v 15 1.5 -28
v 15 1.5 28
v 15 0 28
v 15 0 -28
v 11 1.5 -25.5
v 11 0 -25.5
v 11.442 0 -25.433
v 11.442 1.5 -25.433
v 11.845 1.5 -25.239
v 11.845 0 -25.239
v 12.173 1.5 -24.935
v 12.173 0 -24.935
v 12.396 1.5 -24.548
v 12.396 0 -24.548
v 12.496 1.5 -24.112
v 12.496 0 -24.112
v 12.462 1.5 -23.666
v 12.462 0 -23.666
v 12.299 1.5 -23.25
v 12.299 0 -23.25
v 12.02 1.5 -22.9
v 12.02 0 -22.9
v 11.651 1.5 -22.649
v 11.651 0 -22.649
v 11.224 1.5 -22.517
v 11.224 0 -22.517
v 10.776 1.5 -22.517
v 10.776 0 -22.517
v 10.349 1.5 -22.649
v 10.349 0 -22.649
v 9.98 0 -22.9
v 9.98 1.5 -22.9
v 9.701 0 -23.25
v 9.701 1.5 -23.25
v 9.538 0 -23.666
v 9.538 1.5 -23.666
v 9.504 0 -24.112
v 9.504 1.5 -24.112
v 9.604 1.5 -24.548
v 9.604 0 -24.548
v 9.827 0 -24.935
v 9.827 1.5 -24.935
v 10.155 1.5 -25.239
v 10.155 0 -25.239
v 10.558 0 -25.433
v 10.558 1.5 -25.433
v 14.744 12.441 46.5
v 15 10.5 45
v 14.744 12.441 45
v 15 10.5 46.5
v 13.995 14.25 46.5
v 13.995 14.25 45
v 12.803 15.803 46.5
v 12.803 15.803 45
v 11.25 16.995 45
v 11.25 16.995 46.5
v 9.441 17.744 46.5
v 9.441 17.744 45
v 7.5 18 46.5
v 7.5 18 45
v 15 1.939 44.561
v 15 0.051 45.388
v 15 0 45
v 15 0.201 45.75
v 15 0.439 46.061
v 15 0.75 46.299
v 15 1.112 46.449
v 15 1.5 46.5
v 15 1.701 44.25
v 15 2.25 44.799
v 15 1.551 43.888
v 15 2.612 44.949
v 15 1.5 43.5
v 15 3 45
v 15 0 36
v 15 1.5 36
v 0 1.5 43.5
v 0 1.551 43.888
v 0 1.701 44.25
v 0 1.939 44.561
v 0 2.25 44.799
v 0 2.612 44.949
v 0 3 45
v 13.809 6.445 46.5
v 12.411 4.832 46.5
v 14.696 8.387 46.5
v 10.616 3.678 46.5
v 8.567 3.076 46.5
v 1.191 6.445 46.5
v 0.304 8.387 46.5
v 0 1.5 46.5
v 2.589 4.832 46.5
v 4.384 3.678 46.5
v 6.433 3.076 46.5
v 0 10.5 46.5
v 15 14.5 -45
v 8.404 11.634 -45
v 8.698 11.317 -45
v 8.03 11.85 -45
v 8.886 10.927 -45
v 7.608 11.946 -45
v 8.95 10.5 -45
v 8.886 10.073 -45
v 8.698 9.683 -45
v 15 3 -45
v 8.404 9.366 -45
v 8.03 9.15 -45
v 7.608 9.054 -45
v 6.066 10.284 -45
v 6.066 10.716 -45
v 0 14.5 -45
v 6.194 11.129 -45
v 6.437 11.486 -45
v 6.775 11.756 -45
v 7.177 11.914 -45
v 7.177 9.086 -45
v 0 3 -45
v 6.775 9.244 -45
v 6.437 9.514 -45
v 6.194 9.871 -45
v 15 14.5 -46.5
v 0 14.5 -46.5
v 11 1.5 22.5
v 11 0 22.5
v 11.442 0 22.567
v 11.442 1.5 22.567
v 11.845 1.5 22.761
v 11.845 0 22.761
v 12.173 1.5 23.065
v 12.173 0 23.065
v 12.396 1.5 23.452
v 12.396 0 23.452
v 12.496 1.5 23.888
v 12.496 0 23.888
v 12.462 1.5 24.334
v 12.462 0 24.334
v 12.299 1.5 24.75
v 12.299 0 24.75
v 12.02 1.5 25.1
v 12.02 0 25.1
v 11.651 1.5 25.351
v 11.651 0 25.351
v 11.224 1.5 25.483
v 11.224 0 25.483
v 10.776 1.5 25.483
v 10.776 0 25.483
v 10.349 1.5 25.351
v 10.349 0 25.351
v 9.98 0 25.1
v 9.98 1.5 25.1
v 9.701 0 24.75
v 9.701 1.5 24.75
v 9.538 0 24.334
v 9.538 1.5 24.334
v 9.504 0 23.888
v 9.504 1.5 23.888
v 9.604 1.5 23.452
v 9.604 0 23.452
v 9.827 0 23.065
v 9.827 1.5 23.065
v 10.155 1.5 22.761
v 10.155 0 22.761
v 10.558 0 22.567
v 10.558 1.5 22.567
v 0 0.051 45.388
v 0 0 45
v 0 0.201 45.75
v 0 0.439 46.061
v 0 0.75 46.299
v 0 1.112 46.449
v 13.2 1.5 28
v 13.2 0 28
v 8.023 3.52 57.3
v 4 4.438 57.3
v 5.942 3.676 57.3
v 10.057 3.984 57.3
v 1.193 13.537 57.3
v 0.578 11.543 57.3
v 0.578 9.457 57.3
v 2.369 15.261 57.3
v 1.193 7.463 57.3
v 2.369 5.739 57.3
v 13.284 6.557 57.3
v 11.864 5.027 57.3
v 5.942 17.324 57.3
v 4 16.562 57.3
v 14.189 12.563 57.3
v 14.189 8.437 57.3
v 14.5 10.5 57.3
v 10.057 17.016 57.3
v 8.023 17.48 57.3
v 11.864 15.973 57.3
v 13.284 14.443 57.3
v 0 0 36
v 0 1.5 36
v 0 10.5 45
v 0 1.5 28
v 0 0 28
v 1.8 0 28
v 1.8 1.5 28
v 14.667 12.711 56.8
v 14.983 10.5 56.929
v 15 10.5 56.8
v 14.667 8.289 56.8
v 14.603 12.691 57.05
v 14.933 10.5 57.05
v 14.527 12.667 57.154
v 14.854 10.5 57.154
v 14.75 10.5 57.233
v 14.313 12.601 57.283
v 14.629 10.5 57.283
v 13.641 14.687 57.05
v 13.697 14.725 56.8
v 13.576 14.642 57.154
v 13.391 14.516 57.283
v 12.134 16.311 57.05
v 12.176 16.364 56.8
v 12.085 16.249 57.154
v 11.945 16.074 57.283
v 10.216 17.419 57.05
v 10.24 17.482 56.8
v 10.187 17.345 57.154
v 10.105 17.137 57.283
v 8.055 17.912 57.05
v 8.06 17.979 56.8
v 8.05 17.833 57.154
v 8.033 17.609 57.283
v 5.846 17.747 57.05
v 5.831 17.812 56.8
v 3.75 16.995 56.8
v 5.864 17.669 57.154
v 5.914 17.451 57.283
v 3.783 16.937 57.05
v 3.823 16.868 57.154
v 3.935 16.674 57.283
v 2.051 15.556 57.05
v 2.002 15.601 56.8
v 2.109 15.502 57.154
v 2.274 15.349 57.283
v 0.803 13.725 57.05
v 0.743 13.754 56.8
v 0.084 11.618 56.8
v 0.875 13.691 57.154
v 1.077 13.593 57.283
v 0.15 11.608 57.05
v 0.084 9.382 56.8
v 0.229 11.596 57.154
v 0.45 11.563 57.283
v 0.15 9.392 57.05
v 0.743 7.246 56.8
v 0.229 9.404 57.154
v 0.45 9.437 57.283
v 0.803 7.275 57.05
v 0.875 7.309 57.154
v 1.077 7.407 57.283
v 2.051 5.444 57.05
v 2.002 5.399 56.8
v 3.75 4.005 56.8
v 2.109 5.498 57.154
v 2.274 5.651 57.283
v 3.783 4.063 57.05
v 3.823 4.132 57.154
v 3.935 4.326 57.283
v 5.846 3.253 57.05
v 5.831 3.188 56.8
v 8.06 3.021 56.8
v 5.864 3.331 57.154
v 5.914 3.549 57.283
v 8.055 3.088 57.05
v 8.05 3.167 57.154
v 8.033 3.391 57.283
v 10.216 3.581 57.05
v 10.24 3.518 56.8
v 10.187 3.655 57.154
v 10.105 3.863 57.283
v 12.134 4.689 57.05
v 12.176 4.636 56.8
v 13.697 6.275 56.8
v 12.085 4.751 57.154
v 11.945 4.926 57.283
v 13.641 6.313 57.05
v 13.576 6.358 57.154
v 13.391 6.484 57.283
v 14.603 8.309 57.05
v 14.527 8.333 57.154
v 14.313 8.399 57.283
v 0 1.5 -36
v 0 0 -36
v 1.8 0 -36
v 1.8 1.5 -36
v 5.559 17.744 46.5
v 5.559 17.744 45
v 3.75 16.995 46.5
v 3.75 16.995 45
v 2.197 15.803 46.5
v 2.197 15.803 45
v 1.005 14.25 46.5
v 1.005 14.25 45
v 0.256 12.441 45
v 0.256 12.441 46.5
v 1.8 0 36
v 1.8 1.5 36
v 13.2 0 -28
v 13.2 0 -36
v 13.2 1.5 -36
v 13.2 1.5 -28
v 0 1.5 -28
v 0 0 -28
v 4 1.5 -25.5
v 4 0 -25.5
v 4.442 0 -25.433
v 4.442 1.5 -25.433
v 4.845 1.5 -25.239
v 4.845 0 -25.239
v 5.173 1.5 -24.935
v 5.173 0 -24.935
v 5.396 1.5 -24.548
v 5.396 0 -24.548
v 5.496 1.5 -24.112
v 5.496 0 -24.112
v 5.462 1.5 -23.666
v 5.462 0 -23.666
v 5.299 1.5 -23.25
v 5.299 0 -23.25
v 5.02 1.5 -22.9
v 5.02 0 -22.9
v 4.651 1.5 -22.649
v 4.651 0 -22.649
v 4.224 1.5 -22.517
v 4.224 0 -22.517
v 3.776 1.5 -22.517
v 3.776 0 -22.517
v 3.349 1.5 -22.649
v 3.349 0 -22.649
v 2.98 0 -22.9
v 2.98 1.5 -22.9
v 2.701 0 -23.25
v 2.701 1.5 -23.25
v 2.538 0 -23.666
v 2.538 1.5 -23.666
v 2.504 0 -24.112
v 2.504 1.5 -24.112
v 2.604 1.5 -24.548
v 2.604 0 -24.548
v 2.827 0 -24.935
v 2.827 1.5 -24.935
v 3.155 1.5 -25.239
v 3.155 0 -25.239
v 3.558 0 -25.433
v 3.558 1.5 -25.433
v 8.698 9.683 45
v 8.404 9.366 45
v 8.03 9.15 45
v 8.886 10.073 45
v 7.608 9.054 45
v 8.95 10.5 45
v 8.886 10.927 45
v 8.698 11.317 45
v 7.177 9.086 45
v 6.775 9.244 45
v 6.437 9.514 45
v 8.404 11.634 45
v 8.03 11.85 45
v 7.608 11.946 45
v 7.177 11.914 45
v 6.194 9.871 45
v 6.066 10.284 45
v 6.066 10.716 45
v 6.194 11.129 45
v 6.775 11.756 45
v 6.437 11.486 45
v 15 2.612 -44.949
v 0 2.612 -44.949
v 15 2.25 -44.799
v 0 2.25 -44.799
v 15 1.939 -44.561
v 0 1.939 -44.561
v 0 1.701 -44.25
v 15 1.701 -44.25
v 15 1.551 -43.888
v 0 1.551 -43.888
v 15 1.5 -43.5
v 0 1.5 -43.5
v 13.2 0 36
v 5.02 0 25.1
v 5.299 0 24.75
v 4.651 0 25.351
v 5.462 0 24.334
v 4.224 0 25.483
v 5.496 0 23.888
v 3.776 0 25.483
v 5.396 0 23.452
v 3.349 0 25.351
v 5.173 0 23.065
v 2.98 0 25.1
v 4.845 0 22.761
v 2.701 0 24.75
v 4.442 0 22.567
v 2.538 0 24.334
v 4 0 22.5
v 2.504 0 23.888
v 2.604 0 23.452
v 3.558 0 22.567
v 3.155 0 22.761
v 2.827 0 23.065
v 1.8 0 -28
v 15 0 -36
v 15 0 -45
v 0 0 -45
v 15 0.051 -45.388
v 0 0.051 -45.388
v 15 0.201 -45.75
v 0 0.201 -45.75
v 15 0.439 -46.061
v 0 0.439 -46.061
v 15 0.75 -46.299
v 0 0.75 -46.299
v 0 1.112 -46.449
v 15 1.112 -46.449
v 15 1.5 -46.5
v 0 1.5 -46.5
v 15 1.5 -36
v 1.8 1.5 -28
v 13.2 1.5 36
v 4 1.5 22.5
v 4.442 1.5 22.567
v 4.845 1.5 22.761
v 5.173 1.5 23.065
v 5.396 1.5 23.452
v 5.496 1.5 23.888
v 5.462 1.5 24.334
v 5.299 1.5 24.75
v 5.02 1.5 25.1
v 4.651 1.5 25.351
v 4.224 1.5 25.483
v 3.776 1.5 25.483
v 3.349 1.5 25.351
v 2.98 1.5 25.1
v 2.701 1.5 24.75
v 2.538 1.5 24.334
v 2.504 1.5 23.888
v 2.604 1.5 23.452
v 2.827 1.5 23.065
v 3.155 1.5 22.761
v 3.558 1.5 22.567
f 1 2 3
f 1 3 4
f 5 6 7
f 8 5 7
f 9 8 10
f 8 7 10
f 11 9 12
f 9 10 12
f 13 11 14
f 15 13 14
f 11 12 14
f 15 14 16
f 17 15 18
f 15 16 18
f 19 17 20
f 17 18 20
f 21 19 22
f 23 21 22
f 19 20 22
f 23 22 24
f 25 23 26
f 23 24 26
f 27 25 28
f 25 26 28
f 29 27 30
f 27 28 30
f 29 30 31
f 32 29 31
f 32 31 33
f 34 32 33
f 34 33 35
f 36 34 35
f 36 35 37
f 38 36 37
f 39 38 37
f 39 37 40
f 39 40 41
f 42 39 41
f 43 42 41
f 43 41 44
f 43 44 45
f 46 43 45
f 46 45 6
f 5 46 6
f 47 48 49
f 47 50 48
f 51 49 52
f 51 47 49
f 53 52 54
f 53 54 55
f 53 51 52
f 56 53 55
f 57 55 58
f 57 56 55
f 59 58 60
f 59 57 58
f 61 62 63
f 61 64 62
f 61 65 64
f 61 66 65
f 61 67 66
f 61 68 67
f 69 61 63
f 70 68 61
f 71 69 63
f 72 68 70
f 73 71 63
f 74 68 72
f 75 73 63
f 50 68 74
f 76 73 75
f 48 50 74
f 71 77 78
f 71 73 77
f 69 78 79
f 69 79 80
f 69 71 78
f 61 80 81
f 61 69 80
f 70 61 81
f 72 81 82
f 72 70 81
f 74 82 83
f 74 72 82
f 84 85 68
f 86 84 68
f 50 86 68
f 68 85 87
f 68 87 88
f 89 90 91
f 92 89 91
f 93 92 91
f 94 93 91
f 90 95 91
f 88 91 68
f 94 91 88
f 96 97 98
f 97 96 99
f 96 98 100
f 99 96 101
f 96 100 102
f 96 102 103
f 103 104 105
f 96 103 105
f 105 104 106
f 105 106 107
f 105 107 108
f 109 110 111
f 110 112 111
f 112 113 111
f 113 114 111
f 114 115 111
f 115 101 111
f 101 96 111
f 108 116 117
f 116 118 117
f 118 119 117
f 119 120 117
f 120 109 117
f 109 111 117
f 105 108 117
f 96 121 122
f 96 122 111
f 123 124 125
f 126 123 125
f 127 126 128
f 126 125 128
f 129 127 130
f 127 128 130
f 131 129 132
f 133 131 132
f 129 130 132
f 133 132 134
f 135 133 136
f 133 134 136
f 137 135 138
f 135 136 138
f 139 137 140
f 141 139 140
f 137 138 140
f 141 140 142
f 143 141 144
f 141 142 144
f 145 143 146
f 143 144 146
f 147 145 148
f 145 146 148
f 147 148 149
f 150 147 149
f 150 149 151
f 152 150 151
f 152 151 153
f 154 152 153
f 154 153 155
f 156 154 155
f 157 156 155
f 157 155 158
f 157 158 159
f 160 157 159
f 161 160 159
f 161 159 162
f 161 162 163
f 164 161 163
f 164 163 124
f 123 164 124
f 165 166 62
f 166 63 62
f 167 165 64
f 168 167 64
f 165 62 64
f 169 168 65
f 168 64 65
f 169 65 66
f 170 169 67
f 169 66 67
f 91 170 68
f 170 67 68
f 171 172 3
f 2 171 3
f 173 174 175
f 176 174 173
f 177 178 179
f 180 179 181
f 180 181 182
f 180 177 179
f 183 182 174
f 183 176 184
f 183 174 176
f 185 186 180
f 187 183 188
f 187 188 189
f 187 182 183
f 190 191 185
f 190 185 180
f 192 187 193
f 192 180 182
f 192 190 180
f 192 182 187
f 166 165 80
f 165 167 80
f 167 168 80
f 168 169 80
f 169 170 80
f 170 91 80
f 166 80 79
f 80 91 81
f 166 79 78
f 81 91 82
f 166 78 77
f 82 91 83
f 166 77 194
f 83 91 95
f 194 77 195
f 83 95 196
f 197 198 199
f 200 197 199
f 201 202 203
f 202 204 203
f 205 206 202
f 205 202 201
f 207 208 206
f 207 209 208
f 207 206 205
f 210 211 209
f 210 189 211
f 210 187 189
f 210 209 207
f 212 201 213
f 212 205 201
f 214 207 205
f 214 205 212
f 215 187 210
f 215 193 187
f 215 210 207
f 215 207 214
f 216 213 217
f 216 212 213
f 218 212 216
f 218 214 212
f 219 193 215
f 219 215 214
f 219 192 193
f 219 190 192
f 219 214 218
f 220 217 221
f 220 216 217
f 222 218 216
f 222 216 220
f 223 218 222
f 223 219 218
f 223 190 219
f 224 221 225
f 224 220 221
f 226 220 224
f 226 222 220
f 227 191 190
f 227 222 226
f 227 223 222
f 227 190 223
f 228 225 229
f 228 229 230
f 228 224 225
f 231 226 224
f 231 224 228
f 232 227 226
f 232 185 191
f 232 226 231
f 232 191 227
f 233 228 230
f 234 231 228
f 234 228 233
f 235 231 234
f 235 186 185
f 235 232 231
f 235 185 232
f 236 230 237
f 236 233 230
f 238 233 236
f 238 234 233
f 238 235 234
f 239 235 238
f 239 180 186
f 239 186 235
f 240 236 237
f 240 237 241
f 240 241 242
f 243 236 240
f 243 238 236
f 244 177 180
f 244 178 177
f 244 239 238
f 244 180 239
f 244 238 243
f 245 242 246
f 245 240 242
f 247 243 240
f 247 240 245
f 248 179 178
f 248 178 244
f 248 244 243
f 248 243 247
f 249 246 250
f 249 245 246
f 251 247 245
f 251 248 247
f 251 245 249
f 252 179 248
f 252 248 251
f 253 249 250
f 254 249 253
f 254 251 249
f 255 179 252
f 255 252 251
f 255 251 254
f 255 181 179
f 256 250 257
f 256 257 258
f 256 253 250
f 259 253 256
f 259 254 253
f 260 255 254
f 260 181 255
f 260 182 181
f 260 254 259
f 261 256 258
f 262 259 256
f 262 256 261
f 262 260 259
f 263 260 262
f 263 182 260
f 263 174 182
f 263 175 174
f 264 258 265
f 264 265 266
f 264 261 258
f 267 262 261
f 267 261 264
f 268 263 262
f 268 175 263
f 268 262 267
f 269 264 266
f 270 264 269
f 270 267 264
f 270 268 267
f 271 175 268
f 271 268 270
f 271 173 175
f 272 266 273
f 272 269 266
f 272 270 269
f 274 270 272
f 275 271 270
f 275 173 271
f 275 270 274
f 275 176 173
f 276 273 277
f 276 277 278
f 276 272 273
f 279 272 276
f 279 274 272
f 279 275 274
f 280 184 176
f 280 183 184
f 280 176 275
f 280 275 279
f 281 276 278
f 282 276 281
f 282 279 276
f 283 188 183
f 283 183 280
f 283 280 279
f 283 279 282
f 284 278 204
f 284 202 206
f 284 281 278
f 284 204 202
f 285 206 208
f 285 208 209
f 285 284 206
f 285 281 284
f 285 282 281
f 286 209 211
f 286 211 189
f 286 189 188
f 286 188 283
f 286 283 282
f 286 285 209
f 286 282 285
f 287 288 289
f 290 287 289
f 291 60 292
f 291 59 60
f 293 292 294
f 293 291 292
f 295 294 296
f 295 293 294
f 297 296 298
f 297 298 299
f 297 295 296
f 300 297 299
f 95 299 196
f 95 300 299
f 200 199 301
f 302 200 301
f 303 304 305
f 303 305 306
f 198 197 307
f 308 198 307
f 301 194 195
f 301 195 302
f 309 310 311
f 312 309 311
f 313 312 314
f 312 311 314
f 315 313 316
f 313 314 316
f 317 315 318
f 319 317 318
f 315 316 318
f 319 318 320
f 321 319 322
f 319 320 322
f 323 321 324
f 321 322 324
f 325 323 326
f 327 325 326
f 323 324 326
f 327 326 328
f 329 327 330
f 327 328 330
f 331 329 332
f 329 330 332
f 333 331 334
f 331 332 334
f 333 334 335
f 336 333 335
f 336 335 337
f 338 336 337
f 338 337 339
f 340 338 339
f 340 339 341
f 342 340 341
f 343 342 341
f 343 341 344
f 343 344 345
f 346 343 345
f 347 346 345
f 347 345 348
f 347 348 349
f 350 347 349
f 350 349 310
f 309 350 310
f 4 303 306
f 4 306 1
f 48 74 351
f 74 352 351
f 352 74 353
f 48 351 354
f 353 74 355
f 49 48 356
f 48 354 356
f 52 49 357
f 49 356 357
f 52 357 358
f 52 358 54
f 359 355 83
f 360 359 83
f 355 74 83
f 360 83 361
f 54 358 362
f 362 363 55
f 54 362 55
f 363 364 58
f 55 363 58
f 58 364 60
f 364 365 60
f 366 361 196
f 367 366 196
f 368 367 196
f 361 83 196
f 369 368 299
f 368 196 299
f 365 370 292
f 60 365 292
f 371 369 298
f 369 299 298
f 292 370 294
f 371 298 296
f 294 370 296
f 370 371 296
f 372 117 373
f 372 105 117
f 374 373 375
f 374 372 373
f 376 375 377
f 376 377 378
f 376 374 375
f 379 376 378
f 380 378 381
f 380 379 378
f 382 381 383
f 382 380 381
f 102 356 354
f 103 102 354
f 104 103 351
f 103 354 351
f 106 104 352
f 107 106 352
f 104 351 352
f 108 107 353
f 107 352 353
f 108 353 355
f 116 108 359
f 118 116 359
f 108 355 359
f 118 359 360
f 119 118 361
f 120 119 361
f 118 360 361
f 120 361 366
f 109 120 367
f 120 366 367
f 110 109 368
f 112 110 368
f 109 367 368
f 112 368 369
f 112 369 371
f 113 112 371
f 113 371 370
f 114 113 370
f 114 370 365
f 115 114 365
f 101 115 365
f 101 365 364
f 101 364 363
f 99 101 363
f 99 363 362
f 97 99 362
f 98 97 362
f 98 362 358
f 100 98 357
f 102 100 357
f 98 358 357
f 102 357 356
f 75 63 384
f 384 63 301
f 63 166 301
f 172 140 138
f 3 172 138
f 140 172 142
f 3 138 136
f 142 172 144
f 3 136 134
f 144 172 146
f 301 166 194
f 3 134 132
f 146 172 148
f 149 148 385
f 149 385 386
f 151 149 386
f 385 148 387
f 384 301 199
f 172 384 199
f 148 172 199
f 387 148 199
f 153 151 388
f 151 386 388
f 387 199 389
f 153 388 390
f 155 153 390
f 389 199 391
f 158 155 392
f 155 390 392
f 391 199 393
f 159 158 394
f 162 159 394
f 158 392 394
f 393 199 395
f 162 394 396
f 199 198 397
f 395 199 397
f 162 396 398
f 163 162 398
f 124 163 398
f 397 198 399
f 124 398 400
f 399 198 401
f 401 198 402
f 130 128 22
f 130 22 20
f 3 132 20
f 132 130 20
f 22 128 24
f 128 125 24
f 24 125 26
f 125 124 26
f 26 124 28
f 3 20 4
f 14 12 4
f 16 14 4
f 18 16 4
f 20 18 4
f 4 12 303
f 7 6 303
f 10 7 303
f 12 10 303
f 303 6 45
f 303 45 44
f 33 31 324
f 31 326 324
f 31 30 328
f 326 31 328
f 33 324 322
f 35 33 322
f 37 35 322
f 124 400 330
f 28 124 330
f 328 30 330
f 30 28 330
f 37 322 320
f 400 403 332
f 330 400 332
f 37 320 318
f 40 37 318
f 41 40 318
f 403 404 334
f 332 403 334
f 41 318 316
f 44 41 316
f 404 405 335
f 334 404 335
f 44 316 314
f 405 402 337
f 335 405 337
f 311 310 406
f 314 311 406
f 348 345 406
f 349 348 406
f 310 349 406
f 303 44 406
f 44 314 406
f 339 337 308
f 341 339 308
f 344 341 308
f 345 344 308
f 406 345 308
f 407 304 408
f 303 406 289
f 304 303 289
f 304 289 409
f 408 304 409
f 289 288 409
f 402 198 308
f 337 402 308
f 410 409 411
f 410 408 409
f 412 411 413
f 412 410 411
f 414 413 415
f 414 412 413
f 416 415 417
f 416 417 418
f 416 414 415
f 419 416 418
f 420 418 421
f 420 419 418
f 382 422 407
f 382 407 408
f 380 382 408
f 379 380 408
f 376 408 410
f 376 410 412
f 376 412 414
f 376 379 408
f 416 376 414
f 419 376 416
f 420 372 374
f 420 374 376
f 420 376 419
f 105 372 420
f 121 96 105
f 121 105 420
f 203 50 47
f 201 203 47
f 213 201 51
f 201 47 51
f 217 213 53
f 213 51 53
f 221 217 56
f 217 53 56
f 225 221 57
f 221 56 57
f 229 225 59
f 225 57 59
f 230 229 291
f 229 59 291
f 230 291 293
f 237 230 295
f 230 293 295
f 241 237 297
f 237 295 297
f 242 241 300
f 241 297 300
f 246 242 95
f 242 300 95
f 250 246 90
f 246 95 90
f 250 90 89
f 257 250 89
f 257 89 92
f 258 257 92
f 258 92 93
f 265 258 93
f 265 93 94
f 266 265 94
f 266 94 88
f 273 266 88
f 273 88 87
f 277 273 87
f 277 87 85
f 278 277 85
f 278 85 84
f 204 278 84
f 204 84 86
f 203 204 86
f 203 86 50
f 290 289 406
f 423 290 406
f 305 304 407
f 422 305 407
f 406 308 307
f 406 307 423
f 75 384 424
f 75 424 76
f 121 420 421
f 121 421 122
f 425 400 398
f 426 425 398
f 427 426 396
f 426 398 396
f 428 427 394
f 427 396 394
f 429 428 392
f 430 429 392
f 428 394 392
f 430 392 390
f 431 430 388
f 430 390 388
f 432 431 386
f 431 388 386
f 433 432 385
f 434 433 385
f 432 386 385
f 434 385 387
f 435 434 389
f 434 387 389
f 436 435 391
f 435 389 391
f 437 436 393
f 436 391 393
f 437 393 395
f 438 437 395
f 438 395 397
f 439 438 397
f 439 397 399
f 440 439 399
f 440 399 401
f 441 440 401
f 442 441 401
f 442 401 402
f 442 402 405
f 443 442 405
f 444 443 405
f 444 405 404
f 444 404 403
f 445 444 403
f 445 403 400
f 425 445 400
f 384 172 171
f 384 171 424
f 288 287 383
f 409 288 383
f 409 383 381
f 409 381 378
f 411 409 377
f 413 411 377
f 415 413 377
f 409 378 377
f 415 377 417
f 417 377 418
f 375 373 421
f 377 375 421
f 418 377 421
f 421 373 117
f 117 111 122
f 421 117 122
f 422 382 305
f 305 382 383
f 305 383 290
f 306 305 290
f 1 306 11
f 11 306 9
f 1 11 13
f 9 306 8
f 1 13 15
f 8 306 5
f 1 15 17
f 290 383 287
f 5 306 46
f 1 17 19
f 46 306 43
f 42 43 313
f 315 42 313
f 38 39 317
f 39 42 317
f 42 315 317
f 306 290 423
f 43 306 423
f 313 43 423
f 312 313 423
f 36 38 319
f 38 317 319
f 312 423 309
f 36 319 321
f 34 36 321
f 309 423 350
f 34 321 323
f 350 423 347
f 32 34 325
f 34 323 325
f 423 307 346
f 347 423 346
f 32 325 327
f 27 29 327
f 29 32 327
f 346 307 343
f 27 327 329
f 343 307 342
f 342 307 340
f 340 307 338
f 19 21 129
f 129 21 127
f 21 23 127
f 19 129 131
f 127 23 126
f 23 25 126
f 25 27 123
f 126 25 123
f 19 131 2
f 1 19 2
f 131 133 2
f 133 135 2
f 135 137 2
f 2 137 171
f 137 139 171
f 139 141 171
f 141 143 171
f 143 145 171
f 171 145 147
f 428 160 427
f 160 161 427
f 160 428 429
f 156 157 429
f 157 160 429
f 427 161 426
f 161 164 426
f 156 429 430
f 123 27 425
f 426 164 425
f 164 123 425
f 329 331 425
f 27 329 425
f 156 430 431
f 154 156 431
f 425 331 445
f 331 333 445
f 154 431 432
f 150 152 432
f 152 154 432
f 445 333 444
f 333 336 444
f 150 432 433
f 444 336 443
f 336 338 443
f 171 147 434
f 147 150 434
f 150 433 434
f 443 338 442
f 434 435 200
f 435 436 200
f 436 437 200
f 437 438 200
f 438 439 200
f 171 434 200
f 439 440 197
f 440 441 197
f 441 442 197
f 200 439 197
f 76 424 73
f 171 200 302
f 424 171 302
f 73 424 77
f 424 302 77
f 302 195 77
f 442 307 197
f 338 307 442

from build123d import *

# Parameters (mm, degrees)
BOSS_EXTRU_1_DEPTH      = 15
CONG_1_R                = 1.5
ESQUISSE2_R             = 7.5
BOSS_EXTRU_2_DEPTH      = 10.8
CONG_2_R                = 7.5
ESQUISSE3_R             = 1.5
ESQUISSE3_W             = 1.8
ESQUISSE3_H             = 8
ENL_V_MAT_EXTRU_1_DEPTH = 62.905492487
ESQUISSE4_R             = 1.45
BOSS_EXTRU_3_DEPTH      = 90
CONG_3_R                = 0.5


with BuildPart() as part:
    # Esquisse1 → Boss.-Extru.1 (new body)
    with BuildSketch(Plane(origin=(0, 0, 0), x_dir=(0, 0, -1), z_dir=(1, 0, 0))):
        Polygon((-46.5, 0), (46.5, 0), (46.5, 14.5), (45, 14.5), (45, 1.5), (-45, 1.5), (-45, 18), (-46.5, 18), align=None)
    extrude(amount=BOSS_EXTRU_1_DEPTH)

    # Congé1
    cong_1_edges = [part.edges().sort_by_distance(p)[0] for p in [
        (7.5, 1.5, 45),
        (7.5, 1.5, -45),
        (7.5, 0, -46.5),
        (7.5, 0, 46.5),
    ]]
    fillet(cong_1_edges, radius=CONG_1_R)

    # Esquisse2 → Boss.-Extru.2 (add)
    with BuildSketch(Plane.XY.offset(46.5)):
        with Locations((7.5, 10.5)):
            Circle(ESQUISSE2_R)
    extrude(amount=BOSS_EXTRU_2_DEPTH)

    # Congé2
    cong_2_edges = [part.edges().sort_by_distance(p)[0] for p in [
        (0, 18, 45.75),
        (15, 18, 45.75),
    ]]
    fillet(cong_2_edges, radius=CONG_2_R - 0.0001)  # a hair under: the kernel refuses the full size

    # Esquisse3 → Enlèv. mat.-Extru.1 (cut, through all)
    with BuildSketch(Plane.XZ):
        with Locations(Location((4, 24, 0), (0, 0, 270))):
            Circle(ESQUISSE3_R)
        with Locations(Location((11, 24, 0), (0, 0, 270))):
            Circle(ESQUISSE3_R)
        with Locations(Location((4, -24, 0), (0, 0, 270))):
            Circle(ESQUISSE3_R)
        with Locations(Location((11, -24, 0), (0, 0, 270))):
            Circle(ESQUISSE3_R)
        with Locations((0.9, 32)):
            Rectangle(ESQUISSE3_W, ESQUISSE3_H)
        with Locations((14.1, 32)):
            Rectangle(ESQUISSE3_W, ESQUISSE3_H)
        with Locations((14.1, -32)):
            Rectangle(ESQUISSE3_W, ESQUISSE3_H)
        with Locations((0.9, -32)):
            Rectangle(ESQUISSE3_W, ESQUISSE3_H)
    extrude(amount=-ENL_V_MAT_EXTRU_1_DEPTH, mode=Mode.SUBTRACT)

    # Esquisse4 → Boss.-Extru.3 (add)
    with BuildSketch(Plane(origin=(0, 0, 45), x_dir=(-1, 0, 0), z_dir=(0, 0, -1))):
        with Locations(Location((-7.5, 10.5, 0), (0, 0, 180))):
            Circle(ESQUISSE4_R)
    extrude(amount=BOSS_EXTRU_3_DEPTH)

    # Congé3
    cong_3_edges = [part.edges().sort_by_distance(p)[0] for p in [
        (0, 10.5, 57.3),
    ]]
    fillet(cong_3_edges, radius=CONG_3_R)


solid = part.part
